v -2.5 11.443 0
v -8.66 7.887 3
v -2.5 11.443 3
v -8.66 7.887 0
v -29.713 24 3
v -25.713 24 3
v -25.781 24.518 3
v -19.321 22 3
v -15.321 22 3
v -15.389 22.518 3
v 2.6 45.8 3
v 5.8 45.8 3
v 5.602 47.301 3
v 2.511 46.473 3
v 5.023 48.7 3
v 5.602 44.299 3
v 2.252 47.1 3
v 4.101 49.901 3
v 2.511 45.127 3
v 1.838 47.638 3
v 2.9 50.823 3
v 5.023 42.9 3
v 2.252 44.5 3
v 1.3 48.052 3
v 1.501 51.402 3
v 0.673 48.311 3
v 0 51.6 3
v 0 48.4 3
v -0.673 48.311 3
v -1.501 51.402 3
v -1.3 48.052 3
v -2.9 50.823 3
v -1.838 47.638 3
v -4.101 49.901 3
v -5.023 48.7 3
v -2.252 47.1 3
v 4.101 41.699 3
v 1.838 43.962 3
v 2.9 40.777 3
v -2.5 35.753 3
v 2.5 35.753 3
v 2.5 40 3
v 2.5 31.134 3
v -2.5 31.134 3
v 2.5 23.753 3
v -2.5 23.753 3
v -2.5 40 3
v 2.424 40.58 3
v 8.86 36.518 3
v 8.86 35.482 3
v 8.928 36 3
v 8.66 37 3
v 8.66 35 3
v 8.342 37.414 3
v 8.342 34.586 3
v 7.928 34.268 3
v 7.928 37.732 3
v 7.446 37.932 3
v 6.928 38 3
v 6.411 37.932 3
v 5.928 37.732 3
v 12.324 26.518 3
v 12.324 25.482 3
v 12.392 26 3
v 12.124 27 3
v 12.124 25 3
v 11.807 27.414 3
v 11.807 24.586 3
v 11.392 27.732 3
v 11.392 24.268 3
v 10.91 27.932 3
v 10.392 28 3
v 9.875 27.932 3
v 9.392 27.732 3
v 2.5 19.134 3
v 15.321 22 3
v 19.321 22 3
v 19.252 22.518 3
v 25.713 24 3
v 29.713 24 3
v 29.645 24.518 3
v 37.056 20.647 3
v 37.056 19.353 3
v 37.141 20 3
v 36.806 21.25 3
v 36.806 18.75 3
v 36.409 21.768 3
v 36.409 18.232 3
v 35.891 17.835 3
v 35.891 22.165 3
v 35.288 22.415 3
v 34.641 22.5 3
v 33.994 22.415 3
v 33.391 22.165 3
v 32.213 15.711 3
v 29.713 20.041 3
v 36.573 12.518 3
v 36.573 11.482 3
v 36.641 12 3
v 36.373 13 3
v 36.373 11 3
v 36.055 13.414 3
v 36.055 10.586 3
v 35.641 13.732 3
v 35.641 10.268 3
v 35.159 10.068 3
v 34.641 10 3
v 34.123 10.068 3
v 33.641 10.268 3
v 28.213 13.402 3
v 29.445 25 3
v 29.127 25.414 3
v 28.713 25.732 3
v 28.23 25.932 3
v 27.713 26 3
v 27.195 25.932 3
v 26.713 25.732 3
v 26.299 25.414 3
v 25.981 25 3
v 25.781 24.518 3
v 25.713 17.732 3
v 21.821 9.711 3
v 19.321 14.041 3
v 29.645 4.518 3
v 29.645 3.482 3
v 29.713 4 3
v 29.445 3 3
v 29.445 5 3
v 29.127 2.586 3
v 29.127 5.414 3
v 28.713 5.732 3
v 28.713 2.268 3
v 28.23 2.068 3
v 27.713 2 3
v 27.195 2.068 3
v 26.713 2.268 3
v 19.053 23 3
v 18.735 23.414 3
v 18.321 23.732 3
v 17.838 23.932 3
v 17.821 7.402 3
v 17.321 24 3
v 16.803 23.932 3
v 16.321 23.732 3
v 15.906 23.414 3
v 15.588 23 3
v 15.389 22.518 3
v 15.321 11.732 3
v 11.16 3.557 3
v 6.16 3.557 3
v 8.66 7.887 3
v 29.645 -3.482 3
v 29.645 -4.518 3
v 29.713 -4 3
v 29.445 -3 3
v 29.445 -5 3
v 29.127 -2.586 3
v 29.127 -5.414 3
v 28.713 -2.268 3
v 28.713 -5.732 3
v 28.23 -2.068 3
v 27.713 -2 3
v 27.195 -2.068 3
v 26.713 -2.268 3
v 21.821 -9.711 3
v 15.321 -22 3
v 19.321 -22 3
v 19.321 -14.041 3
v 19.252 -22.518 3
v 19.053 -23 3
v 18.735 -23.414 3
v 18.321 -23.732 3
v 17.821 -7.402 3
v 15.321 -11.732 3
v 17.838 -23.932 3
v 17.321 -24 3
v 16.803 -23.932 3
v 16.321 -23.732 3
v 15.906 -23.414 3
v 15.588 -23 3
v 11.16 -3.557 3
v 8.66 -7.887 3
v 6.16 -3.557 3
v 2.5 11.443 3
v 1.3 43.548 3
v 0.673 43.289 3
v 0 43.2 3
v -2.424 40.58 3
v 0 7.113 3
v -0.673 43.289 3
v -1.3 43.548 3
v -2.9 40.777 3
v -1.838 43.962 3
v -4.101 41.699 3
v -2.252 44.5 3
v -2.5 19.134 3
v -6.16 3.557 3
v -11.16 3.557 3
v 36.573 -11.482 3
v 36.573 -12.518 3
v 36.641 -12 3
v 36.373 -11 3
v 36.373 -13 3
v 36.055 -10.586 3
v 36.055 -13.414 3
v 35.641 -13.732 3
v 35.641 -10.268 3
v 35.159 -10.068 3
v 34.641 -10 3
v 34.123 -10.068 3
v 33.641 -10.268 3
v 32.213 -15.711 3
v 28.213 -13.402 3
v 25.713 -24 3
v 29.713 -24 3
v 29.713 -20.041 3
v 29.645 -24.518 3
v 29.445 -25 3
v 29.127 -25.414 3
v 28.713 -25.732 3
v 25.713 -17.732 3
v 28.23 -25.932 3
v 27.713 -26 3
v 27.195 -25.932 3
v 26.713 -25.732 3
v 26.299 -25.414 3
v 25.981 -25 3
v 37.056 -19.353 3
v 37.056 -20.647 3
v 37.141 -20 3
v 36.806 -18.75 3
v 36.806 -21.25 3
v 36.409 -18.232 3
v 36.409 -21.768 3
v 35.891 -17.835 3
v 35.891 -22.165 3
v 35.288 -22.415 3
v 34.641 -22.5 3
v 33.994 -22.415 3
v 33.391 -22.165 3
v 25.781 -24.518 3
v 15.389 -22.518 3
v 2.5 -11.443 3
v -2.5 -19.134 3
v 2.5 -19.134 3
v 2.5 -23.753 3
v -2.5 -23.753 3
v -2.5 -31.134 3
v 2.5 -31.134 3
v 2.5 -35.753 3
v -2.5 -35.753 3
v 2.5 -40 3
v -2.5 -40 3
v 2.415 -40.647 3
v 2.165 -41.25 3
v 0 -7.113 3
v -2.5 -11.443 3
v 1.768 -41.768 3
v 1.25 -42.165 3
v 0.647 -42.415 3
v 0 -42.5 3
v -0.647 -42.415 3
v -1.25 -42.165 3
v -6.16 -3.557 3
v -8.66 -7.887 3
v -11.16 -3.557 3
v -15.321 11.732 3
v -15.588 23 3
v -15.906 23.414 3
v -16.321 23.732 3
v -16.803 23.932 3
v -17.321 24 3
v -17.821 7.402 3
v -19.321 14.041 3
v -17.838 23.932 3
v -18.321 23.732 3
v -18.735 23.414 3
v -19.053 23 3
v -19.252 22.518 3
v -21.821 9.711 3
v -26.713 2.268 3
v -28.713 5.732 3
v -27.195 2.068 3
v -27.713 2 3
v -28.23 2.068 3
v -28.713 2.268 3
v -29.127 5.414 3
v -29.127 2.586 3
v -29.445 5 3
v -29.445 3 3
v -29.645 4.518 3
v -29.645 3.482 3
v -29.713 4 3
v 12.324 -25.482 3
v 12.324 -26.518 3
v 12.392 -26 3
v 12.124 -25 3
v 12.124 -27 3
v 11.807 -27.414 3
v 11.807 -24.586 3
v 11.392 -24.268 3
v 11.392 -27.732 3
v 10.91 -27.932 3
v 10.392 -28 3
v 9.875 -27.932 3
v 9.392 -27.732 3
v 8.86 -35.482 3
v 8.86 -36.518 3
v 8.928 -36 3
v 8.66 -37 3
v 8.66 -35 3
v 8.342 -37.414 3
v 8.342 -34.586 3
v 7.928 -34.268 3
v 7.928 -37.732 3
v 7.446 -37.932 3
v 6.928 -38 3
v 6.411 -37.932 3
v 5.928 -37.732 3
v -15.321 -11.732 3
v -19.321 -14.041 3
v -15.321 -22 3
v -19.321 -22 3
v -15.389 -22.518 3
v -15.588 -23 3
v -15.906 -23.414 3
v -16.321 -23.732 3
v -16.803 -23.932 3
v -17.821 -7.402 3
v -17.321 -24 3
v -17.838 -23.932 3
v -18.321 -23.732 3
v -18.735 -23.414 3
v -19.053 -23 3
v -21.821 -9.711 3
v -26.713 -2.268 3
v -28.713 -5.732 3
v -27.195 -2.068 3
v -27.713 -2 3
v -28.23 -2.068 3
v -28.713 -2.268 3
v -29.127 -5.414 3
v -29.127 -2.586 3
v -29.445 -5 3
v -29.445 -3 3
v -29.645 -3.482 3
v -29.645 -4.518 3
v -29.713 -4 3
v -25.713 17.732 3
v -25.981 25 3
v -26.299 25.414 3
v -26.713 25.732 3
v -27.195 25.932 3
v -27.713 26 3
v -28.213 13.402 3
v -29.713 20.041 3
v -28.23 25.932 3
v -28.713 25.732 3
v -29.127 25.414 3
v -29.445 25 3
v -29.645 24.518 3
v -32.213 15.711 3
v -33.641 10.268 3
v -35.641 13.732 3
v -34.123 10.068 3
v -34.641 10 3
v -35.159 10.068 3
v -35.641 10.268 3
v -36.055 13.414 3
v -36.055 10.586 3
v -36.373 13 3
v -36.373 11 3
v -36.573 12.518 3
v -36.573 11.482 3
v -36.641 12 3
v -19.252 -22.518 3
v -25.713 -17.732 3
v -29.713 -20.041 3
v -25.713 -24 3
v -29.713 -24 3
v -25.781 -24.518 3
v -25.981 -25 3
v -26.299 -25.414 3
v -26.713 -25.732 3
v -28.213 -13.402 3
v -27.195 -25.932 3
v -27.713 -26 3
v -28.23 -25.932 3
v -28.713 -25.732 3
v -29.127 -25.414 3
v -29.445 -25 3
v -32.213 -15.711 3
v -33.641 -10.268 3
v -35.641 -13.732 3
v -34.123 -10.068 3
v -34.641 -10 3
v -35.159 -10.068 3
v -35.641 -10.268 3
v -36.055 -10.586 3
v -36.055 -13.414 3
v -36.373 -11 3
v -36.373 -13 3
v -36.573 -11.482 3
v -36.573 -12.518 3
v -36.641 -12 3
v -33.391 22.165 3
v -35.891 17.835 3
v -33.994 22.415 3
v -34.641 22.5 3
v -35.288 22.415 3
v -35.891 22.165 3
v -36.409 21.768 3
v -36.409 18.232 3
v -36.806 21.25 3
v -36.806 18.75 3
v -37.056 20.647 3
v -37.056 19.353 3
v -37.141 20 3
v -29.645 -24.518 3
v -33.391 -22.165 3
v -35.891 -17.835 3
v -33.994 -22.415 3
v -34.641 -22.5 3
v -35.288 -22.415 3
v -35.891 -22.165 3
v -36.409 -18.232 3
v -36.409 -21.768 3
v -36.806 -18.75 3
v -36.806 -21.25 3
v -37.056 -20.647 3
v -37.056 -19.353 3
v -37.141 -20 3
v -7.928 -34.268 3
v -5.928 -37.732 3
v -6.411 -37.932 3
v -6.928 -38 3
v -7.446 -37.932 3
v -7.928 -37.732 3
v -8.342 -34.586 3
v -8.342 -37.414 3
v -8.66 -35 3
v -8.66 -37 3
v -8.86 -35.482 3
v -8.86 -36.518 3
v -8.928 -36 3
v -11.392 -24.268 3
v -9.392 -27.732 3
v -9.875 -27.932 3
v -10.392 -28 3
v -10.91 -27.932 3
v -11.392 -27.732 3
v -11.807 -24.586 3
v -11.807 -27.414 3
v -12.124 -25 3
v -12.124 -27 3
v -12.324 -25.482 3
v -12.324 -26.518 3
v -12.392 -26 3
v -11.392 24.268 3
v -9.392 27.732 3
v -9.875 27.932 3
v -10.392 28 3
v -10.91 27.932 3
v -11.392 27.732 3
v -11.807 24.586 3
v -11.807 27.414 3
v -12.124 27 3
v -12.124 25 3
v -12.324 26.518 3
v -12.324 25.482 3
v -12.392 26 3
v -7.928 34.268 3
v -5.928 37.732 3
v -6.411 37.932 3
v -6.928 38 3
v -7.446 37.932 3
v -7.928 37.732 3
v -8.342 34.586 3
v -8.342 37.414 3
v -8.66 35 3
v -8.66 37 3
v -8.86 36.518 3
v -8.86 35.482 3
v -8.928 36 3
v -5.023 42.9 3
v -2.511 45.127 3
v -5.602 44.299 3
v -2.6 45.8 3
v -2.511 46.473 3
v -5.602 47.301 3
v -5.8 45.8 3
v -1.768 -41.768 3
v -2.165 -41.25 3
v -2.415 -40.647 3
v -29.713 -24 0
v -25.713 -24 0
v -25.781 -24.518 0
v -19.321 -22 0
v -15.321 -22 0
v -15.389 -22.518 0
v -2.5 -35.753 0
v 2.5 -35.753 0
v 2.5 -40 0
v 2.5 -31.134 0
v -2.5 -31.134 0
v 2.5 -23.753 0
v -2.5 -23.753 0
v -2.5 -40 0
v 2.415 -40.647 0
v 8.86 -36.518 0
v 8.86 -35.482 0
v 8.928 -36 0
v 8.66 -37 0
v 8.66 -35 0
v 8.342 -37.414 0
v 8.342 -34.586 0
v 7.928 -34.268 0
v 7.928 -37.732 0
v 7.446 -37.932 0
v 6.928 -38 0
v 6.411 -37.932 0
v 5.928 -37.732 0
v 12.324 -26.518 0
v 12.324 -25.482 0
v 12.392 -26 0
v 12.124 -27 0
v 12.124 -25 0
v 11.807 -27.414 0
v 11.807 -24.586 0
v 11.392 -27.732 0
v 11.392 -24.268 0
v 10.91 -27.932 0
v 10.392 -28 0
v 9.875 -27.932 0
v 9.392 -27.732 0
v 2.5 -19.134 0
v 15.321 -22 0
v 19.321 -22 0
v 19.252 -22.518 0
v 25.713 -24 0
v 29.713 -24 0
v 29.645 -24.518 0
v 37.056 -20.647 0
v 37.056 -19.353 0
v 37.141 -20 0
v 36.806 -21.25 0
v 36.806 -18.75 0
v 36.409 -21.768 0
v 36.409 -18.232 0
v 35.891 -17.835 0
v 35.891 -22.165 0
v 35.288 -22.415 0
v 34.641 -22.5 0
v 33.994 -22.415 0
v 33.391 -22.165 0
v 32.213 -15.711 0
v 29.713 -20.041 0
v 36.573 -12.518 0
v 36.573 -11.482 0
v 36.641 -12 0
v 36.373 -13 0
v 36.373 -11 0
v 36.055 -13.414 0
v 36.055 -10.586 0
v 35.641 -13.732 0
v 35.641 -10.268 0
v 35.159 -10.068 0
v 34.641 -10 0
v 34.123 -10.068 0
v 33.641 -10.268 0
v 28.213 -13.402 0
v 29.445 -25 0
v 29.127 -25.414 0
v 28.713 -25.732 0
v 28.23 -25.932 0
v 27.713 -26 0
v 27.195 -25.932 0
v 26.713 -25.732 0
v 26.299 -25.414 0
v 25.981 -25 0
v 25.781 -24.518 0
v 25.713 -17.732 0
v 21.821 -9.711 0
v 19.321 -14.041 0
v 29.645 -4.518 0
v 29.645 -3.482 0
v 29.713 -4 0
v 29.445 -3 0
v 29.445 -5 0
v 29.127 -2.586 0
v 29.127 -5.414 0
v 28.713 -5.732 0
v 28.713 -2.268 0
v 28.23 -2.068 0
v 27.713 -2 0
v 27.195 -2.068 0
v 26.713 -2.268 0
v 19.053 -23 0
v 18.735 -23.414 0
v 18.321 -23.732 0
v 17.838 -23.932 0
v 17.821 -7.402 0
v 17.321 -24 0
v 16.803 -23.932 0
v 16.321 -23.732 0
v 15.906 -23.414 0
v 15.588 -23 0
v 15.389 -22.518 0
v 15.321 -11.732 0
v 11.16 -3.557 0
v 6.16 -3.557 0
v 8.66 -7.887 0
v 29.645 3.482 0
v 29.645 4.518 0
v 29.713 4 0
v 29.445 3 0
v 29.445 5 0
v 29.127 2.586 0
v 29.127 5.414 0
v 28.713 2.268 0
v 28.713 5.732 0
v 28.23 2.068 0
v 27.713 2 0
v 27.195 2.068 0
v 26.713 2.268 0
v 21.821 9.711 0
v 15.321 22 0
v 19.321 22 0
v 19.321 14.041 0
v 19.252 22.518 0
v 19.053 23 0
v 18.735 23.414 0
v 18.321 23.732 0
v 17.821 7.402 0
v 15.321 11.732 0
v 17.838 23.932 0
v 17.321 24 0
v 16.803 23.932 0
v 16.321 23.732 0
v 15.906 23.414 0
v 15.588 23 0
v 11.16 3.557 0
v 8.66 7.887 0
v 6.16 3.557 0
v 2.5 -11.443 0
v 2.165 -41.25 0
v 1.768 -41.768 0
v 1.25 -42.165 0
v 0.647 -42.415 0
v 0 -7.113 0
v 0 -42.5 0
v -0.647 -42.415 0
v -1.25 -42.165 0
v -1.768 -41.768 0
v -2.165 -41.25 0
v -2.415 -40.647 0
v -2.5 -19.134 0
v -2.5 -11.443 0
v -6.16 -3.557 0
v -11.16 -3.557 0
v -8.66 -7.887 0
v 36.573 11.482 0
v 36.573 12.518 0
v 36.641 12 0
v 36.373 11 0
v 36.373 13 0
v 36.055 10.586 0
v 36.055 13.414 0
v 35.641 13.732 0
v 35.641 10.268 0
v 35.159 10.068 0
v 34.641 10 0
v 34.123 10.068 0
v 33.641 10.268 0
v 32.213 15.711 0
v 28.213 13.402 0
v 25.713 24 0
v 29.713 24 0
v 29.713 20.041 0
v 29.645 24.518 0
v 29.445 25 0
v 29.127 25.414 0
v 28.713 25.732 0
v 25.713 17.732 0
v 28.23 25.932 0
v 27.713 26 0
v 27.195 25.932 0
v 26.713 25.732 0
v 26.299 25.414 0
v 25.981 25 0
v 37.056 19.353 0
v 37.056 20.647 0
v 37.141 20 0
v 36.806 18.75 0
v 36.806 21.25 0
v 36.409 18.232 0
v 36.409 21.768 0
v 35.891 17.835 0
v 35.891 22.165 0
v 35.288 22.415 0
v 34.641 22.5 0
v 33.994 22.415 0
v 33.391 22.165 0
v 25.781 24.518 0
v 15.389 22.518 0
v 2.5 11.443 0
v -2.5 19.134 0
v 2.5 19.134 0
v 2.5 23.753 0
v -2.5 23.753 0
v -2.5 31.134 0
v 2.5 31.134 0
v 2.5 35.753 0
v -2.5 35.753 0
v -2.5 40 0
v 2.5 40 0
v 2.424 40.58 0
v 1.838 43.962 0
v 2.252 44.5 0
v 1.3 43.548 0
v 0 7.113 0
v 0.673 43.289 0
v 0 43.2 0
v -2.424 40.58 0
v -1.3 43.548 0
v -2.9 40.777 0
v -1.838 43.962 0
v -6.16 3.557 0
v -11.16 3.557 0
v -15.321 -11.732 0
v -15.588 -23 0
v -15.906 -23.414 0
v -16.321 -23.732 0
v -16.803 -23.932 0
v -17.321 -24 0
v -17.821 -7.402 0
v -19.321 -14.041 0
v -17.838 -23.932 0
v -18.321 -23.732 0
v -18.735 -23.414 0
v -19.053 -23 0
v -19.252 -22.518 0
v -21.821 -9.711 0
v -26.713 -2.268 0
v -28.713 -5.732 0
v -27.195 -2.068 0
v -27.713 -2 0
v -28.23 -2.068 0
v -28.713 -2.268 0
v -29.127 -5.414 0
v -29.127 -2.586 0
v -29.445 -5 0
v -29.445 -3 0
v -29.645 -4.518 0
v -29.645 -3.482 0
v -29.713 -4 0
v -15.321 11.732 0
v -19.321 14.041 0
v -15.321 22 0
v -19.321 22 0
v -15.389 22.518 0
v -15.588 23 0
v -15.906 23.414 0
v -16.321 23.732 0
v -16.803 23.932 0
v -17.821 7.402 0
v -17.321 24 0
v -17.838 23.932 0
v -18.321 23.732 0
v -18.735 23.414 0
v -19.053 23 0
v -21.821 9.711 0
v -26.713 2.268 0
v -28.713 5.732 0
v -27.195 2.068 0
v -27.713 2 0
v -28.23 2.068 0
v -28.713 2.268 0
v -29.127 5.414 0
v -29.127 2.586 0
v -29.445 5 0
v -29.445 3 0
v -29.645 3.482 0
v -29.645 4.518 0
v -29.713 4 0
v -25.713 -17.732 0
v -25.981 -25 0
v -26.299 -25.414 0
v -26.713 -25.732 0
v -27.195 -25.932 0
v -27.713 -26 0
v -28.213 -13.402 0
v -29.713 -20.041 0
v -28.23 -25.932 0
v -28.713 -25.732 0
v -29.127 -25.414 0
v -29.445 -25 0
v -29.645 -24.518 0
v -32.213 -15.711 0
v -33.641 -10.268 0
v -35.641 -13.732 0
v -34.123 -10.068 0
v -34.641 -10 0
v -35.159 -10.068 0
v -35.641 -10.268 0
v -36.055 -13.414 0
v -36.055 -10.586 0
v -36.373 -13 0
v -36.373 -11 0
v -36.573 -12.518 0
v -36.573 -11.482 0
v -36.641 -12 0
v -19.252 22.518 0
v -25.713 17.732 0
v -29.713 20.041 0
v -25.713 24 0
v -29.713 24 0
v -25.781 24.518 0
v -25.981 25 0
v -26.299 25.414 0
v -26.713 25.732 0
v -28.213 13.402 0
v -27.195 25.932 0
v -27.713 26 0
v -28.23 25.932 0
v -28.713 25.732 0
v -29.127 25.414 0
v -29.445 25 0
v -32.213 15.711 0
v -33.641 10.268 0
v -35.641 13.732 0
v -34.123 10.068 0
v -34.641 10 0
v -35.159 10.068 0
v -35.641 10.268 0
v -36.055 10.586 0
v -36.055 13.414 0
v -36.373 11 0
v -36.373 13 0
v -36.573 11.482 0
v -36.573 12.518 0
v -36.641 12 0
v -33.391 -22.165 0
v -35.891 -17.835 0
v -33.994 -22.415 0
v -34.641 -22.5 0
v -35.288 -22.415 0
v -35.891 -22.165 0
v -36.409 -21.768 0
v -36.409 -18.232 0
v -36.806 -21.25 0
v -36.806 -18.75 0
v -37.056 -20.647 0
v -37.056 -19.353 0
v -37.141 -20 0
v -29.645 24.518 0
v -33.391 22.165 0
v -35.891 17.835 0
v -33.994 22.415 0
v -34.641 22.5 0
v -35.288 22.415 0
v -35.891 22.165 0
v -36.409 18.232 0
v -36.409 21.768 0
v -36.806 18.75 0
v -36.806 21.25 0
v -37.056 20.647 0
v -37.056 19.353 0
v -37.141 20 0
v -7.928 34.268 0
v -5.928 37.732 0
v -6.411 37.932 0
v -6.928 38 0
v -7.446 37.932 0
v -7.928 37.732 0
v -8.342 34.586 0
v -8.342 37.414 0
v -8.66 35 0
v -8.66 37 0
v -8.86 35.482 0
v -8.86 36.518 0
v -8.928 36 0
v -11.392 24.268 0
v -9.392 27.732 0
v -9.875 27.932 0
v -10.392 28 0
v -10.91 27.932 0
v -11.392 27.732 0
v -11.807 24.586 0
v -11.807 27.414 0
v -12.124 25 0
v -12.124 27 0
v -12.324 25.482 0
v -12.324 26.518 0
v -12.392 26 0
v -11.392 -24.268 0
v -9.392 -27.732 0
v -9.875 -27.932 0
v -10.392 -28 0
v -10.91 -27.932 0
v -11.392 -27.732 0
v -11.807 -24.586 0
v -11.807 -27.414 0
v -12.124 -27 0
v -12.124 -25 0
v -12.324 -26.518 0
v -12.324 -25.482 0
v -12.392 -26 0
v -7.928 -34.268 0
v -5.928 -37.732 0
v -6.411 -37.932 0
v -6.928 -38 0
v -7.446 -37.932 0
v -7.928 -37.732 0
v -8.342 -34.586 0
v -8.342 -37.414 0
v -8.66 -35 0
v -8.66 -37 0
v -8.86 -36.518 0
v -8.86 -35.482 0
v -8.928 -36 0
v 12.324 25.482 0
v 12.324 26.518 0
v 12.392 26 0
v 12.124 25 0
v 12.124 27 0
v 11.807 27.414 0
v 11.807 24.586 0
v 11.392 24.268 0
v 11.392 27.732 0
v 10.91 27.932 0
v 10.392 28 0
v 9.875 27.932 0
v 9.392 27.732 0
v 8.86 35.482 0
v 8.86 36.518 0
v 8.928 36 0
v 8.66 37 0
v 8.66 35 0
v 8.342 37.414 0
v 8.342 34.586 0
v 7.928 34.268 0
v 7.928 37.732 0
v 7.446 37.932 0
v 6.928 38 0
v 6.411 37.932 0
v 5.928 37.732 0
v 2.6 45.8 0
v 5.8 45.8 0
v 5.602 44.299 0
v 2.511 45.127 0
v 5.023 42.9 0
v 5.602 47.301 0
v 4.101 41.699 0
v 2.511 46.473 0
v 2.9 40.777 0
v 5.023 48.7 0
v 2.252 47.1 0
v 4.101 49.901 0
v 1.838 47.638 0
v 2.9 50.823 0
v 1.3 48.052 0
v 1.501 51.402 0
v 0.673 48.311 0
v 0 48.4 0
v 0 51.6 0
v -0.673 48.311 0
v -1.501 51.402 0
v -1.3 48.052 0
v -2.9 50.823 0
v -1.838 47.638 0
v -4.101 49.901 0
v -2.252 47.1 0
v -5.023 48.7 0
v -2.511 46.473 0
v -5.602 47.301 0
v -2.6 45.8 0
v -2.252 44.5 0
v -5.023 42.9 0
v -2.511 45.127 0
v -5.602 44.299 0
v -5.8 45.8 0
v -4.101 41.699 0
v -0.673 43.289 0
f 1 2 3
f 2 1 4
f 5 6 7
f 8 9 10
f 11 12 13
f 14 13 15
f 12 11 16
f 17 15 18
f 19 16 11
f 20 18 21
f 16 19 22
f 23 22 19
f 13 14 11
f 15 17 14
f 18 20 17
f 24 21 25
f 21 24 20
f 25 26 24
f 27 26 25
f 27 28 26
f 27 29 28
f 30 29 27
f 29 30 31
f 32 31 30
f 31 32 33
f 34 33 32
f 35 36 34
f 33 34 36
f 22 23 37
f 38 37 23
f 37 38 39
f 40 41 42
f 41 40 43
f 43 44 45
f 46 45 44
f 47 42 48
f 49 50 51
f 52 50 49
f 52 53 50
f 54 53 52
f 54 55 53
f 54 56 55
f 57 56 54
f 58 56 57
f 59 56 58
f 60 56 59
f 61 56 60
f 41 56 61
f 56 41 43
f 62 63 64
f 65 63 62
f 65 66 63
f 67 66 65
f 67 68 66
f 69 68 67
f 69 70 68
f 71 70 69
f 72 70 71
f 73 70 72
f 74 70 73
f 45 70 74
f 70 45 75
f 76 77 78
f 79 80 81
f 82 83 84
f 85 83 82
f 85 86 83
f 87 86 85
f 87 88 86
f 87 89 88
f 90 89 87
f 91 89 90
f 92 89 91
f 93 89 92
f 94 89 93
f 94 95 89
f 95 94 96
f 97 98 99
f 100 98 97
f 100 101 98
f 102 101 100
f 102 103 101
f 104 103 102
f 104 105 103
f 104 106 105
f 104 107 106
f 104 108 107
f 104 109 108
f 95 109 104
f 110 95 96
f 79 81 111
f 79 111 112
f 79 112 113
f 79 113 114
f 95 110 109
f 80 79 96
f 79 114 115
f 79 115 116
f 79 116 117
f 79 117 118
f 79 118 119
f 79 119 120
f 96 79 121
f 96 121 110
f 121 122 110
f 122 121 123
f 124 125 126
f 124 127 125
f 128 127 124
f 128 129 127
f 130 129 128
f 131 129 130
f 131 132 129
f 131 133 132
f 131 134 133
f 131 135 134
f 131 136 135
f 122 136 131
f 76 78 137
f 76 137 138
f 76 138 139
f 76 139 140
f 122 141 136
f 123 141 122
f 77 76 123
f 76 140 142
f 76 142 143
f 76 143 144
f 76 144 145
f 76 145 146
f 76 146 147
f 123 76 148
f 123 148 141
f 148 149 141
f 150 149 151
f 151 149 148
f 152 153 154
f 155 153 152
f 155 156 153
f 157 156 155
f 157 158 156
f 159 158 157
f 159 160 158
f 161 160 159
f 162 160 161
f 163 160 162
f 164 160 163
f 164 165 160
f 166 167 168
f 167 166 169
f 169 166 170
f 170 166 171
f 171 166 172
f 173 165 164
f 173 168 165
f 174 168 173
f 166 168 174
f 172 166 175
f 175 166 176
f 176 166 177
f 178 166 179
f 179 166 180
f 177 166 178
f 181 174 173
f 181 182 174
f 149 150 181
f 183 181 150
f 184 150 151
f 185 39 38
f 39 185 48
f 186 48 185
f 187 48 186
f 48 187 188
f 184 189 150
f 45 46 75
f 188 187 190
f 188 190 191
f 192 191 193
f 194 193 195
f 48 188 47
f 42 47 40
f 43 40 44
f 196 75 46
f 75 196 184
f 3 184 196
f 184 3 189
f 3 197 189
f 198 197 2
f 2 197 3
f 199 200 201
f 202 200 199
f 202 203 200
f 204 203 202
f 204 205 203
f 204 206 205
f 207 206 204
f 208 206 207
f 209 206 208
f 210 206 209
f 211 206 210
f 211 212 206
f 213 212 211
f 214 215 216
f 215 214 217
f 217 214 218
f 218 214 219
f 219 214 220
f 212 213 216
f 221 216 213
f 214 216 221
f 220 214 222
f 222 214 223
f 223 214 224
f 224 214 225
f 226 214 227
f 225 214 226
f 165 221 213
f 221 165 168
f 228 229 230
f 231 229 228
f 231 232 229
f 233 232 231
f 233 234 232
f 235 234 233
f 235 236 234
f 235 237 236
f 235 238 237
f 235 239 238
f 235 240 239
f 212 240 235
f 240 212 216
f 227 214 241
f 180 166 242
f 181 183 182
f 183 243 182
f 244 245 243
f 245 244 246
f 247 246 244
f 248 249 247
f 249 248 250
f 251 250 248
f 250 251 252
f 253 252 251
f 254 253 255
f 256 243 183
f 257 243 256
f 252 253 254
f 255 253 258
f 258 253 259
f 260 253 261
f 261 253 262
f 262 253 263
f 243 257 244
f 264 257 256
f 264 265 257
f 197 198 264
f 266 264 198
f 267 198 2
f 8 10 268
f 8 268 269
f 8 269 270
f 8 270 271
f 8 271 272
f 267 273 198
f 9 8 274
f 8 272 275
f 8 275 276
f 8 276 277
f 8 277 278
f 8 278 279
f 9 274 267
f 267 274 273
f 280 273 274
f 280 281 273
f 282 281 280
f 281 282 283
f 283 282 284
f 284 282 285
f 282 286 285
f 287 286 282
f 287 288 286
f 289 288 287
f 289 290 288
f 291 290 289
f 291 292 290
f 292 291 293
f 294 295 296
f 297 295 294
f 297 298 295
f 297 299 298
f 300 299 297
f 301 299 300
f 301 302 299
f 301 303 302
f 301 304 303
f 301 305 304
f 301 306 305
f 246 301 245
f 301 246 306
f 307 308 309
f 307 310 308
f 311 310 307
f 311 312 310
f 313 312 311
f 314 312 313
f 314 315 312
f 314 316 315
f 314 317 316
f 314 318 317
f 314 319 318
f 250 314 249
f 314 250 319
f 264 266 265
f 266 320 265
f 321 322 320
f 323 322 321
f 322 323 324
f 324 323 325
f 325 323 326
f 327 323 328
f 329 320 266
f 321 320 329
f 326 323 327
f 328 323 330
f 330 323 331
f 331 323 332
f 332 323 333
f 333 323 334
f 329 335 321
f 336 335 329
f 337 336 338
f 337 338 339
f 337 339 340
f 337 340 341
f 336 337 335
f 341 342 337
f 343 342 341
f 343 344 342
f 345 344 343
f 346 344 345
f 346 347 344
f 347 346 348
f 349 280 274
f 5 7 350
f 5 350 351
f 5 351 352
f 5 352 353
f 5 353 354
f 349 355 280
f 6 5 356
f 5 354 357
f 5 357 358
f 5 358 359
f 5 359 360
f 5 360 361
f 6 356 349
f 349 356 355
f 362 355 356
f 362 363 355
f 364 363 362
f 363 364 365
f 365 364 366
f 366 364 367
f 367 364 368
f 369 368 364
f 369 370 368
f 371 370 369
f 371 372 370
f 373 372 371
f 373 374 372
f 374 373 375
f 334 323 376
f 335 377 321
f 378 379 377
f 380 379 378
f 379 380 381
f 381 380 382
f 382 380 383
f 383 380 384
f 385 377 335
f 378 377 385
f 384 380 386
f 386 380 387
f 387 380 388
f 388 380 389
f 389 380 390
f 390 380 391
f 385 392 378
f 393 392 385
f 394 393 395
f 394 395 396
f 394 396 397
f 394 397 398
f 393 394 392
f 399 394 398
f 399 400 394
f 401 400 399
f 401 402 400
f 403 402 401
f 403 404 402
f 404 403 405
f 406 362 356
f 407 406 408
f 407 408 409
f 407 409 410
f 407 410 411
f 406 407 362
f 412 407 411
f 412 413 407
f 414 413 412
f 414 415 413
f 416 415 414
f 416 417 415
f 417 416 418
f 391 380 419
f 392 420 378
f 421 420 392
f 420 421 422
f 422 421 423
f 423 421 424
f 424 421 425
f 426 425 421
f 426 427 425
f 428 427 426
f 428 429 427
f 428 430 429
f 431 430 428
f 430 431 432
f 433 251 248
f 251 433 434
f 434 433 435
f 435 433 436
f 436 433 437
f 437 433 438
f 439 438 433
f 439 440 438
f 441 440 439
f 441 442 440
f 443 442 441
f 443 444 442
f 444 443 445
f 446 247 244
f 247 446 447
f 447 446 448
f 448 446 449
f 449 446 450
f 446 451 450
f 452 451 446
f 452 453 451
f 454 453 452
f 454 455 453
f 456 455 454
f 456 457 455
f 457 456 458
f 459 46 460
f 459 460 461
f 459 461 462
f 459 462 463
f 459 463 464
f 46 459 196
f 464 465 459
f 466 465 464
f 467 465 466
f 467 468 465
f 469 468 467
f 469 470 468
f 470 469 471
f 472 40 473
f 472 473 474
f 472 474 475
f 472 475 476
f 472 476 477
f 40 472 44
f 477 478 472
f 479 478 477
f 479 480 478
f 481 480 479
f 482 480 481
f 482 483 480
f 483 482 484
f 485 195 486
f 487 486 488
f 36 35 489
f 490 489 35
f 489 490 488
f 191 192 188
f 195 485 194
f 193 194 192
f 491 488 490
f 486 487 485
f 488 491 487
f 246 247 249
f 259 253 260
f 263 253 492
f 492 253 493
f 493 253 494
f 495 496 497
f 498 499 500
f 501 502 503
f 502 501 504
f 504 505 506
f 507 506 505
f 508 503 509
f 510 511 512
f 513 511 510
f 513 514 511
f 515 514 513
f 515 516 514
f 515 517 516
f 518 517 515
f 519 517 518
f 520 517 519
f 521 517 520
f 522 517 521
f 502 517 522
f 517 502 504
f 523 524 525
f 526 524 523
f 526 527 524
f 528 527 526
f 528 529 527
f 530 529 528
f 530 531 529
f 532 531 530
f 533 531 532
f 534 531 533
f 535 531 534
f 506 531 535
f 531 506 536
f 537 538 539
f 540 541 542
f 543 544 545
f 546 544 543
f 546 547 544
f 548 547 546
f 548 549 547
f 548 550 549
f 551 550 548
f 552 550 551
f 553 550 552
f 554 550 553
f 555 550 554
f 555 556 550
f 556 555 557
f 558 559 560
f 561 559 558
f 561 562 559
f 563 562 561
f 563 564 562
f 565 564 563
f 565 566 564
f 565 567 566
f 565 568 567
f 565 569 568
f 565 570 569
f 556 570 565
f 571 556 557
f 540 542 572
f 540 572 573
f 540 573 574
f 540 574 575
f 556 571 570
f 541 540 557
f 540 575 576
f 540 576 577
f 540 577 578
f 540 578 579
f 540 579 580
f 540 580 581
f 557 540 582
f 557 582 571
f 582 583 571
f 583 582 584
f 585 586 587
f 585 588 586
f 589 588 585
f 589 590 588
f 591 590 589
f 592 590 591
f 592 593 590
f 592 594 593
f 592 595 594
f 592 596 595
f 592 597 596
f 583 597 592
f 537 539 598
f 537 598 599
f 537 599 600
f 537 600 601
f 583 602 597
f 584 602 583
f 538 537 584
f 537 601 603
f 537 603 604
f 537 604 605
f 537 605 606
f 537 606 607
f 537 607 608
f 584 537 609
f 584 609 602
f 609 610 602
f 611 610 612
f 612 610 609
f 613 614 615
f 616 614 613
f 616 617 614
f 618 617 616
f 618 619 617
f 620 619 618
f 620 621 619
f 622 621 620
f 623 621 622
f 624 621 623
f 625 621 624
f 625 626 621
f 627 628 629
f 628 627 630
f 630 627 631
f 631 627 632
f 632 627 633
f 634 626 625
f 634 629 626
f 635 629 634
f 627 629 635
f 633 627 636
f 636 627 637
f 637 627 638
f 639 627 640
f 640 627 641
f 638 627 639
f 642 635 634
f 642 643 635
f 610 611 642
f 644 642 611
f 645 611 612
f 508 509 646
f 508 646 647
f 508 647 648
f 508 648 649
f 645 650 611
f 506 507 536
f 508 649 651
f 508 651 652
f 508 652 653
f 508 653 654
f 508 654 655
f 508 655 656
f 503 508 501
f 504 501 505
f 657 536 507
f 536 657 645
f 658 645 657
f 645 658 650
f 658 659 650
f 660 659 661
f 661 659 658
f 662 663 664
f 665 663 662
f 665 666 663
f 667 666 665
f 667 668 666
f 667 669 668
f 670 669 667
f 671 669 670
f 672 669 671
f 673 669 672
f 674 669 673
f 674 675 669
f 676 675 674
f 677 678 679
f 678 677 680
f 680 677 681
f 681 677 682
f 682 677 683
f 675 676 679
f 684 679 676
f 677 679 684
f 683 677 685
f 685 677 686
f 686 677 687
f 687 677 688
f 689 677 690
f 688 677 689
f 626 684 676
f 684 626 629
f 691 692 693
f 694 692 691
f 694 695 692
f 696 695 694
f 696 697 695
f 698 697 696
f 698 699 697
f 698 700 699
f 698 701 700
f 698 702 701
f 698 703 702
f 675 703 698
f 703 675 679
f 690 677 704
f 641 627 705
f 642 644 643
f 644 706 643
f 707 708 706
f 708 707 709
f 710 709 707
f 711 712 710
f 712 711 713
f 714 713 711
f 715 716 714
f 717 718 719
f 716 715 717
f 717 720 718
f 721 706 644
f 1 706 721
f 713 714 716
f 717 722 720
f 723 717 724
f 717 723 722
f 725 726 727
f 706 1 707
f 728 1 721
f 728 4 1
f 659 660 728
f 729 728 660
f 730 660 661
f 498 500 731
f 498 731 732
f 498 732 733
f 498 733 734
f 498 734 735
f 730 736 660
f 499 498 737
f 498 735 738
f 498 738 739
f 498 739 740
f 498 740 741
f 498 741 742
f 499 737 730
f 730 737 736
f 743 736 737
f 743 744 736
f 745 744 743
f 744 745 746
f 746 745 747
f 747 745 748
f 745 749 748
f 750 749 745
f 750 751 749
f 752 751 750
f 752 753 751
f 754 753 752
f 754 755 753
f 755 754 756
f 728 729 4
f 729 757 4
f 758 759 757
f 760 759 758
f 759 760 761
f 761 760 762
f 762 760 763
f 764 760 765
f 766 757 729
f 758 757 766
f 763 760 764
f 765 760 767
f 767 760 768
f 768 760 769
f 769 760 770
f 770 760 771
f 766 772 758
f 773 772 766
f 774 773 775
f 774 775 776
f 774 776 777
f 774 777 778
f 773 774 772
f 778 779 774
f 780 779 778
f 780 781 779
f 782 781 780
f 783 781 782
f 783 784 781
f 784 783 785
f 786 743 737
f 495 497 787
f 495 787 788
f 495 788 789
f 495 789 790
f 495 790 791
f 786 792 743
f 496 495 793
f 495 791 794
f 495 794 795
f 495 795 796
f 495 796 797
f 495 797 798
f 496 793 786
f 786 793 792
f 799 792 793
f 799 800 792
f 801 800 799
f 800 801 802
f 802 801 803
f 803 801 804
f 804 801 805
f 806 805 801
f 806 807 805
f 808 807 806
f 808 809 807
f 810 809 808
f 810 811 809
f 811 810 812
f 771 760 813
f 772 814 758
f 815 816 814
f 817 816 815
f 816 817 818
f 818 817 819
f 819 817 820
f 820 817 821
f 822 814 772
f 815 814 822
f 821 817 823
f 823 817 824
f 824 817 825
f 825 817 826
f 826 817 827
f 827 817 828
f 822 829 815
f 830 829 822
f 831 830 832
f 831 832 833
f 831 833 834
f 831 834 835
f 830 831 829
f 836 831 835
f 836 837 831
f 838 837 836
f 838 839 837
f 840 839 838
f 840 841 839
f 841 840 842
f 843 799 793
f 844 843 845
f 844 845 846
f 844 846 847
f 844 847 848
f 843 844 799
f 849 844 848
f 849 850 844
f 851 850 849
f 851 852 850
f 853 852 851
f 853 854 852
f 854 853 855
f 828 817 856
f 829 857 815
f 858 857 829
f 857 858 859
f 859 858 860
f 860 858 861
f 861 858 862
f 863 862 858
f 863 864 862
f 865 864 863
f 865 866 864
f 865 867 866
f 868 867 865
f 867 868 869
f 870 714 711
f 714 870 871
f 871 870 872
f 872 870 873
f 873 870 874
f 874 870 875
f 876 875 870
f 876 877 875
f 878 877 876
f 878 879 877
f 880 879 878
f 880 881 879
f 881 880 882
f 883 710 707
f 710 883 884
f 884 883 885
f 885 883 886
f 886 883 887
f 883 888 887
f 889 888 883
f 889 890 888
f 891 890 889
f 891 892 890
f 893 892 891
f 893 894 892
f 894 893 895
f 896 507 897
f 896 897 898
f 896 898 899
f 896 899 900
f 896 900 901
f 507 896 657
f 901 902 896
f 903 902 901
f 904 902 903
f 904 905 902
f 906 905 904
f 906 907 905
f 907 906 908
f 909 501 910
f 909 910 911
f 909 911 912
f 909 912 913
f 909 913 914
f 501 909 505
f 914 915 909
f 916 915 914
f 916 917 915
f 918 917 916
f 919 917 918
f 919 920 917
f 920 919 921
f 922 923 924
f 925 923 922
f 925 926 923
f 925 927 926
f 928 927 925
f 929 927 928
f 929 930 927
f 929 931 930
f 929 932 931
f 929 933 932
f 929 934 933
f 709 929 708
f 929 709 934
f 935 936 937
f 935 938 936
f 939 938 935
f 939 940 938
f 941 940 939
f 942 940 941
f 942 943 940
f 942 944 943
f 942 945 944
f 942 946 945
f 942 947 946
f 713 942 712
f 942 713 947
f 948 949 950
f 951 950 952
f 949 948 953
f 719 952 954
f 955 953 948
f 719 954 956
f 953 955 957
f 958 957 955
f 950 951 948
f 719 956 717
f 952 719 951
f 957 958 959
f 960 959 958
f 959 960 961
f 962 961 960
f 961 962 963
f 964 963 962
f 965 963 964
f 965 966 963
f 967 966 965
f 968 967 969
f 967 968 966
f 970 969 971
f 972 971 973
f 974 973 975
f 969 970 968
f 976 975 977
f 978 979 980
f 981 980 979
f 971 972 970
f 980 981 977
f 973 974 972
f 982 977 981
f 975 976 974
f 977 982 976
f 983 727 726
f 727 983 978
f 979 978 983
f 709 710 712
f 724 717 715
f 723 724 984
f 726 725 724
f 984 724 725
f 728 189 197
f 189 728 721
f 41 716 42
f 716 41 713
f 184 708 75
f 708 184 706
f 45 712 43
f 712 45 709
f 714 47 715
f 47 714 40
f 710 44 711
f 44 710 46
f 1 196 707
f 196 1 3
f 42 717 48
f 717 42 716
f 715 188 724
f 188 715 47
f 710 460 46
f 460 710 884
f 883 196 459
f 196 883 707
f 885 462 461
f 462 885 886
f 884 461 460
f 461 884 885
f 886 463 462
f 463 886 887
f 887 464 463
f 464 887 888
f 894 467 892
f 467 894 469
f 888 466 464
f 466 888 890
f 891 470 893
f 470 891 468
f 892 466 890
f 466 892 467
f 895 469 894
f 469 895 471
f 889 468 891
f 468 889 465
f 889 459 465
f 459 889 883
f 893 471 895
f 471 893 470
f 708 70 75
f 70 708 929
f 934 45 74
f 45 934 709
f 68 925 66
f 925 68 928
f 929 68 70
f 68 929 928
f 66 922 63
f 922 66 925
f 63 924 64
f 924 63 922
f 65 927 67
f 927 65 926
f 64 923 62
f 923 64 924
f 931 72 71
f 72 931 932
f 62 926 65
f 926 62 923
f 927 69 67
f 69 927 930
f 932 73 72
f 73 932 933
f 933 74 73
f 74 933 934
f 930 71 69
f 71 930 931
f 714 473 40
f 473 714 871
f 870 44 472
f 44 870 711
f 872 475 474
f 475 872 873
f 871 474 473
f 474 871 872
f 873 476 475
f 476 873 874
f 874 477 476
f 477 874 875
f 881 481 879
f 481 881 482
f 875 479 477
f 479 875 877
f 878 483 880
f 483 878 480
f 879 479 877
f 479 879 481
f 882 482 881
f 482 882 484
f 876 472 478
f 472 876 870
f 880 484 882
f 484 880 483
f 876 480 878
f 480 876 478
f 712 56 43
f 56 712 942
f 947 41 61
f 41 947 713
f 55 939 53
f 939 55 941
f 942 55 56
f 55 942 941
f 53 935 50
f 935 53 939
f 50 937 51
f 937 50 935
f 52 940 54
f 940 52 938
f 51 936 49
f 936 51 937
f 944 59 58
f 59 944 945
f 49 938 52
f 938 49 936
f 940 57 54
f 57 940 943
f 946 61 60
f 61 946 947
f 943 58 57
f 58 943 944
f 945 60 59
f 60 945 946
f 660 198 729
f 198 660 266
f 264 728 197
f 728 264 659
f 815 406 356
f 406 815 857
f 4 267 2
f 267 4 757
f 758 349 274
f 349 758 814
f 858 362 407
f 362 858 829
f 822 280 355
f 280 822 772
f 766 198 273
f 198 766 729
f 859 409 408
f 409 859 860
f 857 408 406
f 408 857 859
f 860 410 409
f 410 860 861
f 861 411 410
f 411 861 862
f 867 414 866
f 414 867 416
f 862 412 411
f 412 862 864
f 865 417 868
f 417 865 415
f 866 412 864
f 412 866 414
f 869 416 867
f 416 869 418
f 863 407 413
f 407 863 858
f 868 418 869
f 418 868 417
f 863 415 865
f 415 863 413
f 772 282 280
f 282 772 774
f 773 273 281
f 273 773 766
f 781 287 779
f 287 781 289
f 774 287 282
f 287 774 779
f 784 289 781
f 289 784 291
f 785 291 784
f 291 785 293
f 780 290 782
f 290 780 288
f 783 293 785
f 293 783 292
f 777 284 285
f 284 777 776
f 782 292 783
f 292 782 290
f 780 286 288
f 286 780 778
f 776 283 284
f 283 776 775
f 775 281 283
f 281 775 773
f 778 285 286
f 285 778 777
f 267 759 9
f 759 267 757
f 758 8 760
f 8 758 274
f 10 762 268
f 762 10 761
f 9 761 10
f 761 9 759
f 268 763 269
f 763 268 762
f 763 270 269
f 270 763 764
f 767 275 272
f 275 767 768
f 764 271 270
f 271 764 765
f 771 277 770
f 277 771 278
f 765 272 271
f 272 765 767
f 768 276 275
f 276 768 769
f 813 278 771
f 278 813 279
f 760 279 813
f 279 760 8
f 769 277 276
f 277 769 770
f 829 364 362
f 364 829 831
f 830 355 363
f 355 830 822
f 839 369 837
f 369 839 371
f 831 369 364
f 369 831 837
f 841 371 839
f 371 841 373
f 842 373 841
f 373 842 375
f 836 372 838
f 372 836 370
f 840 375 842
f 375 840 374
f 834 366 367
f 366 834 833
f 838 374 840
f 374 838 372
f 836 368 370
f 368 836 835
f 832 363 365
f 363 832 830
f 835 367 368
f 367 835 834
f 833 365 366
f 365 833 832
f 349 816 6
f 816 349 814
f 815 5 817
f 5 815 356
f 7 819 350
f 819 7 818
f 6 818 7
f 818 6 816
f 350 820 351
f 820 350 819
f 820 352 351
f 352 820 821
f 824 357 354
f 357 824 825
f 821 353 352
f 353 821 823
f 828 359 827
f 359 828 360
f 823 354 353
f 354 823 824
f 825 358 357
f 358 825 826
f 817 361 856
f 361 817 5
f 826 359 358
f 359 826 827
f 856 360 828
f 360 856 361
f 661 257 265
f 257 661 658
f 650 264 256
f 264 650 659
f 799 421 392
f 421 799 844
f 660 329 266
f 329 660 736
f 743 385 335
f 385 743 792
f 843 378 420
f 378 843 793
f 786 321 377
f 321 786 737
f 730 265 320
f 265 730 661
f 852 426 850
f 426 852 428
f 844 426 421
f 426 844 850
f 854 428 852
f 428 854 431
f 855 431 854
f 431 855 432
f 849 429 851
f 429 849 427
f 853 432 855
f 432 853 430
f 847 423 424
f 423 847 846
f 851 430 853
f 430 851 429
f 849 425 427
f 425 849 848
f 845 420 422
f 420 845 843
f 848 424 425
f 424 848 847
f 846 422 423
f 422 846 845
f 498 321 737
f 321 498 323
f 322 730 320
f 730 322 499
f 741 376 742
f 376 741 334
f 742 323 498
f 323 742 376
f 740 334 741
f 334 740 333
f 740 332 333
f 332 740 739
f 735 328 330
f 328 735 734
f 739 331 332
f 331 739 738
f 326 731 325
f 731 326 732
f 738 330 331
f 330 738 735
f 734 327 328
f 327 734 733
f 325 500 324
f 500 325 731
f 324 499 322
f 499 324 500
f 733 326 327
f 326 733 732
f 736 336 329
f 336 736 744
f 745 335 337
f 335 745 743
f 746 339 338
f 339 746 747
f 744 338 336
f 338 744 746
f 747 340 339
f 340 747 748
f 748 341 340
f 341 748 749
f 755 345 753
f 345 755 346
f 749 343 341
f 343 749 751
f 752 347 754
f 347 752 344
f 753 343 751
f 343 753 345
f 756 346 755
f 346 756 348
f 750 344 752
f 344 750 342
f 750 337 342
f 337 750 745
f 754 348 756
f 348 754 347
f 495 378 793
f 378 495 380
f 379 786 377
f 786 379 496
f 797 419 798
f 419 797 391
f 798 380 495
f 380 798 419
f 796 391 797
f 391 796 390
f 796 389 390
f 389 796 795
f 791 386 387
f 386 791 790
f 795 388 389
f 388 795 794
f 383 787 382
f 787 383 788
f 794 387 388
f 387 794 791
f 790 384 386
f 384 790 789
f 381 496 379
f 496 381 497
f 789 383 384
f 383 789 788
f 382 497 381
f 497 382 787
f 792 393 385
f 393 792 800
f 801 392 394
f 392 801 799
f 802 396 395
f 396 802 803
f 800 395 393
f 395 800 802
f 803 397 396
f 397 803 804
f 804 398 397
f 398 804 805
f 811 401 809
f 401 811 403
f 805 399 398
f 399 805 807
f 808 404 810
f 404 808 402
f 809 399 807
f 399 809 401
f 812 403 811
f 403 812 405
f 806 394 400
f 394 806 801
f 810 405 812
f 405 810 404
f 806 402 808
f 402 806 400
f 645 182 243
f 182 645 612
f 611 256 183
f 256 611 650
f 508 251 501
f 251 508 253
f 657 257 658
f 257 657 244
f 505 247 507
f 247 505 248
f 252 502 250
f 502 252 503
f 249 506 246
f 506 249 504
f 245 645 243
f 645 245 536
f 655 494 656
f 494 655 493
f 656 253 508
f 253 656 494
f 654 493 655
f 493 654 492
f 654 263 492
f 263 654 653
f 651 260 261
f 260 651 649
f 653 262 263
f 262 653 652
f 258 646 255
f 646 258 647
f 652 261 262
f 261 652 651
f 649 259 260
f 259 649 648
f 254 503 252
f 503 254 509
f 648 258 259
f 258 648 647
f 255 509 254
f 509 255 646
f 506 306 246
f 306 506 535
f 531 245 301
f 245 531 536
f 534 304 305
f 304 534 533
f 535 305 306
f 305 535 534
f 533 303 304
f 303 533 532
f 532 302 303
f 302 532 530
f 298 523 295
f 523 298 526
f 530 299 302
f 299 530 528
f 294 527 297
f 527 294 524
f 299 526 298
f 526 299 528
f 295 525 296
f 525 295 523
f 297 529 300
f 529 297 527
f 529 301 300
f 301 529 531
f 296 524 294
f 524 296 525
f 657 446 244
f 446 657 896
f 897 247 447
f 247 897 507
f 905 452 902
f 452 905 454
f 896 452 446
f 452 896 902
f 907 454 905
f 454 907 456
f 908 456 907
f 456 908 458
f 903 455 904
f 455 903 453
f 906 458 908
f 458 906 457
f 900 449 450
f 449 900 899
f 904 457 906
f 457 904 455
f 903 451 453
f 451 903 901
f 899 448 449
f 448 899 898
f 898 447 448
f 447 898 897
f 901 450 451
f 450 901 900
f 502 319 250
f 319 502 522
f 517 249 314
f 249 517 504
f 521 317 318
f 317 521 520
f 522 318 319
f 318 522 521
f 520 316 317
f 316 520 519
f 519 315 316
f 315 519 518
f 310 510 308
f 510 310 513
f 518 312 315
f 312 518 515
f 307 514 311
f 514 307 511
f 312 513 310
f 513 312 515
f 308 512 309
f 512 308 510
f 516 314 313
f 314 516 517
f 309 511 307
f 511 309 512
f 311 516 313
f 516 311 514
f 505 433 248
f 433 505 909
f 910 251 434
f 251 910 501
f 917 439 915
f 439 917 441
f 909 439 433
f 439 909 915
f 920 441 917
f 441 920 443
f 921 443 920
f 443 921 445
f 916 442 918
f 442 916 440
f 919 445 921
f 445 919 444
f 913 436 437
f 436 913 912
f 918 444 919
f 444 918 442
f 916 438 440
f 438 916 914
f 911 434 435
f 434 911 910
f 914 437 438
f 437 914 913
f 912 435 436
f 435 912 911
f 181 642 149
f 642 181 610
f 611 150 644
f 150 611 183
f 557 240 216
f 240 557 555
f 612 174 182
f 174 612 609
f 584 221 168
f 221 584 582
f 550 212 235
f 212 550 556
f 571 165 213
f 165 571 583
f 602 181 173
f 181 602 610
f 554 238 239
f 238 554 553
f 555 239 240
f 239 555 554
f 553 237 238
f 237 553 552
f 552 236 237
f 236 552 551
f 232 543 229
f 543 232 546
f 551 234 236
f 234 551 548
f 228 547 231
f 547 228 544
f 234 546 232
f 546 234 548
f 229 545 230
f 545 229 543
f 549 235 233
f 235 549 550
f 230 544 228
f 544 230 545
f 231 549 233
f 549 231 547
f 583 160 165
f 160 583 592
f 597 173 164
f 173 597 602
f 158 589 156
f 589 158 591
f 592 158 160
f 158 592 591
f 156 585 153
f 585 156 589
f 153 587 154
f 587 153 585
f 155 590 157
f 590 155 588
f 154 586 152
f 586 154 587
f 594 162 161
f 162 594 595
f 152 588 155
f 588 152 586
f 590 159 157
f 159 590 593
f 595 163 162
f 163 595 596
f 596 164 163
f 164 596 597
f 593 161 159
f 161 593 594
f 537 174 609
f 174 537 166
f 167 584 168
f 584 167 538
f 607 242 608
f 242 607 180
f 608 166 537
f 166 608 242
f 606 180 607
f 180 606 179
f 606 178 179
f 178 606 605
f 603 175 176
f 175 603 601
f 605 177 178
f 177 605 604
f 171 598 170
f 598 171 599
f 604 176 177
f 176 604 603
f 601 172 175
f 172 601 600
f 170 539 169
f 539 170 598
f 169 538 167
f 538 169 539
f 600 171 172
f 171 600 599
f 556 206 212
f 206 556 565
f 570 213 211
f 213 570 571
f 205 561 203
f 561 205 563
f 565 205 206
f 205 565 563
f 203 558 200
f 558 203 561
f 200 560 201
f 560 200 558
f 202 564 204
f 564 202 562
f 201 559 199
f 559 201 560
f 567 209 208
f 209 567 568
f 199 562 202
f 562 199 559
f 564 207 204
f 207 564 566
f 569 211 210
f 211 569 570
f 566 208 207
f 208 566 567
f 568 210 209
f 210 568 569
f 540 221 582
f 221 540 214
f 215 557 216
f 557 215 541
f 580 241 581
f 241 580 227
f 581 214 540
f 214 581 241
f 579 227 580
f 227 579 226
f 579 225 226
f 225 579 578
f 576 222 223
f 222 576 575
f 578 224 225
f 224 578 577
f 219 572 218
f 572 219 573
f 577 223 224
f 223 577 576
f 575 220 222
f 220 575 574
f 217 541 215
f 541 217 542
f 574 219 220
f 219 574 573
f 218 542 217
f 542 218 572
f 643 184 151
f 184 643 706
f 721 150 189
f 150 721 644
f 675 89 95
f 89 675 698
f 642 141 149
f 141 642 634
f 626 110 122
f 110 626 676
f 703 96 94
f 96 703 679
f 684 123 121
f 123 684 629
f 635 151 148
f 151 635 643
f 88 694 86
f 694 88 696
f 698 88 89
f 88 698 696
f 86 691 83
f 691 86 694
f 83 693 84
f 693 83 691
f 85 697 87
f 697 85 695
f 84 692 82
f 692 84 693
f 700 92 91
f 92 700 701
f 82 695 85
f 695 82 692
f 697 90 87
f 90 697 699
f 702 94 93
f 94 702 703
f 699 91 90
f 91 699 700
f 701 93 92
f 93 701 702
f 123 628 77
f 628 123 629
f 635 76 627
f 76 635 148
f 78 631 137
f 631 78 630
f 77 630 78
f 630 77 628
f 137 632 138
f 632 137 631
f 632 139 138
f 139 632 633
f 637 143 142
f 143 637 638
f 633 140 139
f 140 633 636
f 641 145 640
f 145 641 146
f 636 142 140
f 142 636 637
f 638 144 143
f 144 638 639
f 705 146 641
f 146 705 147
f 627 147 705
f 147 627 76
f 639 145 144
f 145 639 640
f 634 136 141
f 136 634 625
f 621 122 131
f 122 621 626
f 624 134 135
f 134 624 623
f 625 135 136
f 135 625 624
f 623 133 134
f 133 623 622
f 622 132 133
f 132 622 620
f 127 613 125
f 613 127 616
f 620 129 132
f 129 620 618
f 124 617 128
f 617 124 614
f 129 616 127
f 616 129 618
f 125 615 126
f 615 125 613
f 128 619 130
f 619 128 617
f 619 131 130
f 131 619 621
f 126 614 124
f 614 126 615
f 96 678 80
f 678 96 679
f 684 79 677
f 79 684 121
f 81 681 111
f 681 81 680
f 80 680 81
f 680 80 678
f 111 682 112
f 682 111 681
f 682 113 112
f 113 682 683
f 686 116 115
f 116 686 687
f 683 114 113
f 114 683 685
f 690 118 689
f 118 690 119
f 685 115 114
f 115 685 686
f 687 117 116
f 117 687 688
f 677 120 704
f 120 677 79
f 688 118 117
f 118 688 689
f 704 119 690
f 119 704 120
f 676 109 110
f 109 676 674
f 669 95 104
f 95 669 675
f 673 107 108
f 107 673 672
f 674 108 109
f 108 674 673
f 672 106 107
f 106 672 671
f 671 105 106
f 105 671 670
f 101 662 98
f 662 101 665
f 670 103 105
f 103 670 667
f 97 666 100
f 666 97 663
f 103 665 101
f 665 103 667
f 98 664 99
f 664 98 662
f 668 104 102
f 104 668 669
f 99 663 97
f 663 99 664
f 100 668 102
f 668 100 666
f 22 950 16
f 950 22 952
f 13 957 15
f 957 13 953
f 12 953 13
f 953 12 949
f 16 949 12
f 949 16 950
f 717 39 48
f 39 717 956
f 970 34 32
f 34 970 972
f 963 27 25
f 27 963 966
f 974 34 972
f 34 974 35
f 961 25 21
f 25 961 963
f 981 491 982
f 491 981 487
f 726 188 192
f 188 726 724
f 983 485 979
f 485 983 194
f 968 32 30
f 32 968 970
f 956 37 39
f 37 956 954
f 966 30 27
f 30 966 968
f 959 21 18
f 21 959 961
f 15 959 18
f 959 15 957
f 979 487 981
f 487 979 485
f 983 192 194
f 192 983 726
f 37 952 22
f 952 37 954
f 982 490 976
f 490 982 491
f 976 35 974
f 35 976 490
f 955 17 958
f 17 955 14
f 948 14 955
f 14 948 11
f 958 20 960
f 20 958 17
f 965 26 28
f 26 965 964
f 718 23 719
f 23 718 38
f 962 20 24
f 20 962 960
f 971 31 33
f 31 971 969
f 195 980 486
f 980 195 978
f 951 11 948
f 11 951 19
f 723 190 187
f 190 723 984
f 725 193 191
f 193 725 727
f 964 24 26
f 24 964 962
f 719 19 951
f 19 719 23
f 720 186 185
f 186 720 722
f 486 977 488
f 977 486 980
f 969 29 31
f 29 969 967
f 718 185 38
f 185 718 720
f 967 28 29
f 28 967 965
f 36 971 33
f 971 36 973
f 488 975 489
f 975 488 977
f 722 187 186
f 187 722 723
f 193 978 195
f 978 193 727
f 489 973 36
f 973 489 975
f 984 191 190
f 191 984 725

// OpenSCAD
// snowflake 3
// @author Ilya Protasov

/* TODO
? fix central figure for branch_count
? hole hanger type
*/

/* [Base] */
height = 3;
radius = 40;
hanger_type = "ring";// [ring, slot ,none]
// only for slot hanger type
slot_rounded = true;

/* [Extended coefficients] */
// coefficient of radius for central (main) branch thickness
central_thickness_coef = 0.125; // [0:0.001:0.300]
central_branch_start_coef = 0.25; // [0:0.001:1]

middle_branch_start_coef = 0.5; // [0:0.001:1]
middle_branch_length_coef = 0.3; // [0:0.001:1]
middle_thickness_coef = 0.100; // [0:0.001:0.300]

outer_branch_start_coef = 0.8; // [0:0.001:1]
outer_branch_length_coef = 0.2; // [0:0.001:1]
outer_thickness_coef = 0.100; // [0:0.001:0.300]

// (for ring type hanger only)
ring_inner_radius_coef = 0.065; // [0:0.001:0.300]
// difference between outer and inner radius (for ring type hanger only)
ring_thick_coef = 0.080; // [0:0.001:0.300]

slot_start_coef = 0.95; // [0:0.01:1.000]
// slot thickness coeficient from snowflake height
slot_thick_coef = 0.100; // [0:0.001:2.200]
// slot height coeficient from snowflake height
slot_height_coef = 0.300; // [0:0.001:0.500]
// change it only if slot intersects main sub branches
slot_length_coef = 1.010; // [1.010:0.001:5.000]

/* [Quality ] */
//count of segments in arcs https://en.wikibooks.org/wiki/OpenSCAD_User_Manual/Other_Language_Features#$fa,_$fs_and_$fn
$fn = 24; 

/* [Hidden]  */
branch_count = 6;

thickMain = radius * central_thickness_coef;
middleThick = radius * middle_thickness_coef;
outerThick = radius * outer_thickness_coef;

module branchMain() {
    centralAngle = 120;//360 / branch_count * 2;
    lenHex = radius * central_branch_start_coef;
    middleStart = radius * middle_branch_start_coef;
    outerStart = radius * outer_branch_start_coef;
    
    //central hexagon
    translate([0, lenHex, 0]) rotate([0, 0, centralAngle]) branch2(thickMain, lenHex);
    
    //central branch
    translate([0, lenHex, 0]) branch2(thickMain, radius-lenHex);
    
    //middle branchs
    translate([0, middleStart, 0]) rotate([0, 0, 60]) branch2(middleThick, radius * middle_branch_length_coef);
    translate([0, middleStart, 0]) rotate([0, 0, -60]) branch2(middleThick, radius * middle_branch_length_coef);
    
    //outer branchs
    translate([0, outerStart, 0]) rotate([0, 0, 60]) branch2(outerThick, radius * outer_branch_length_coef);
    translate([0, outerStart, 0]) rotate([0, 0, -60]) branch2(outerThick, radius * outer_branch_length_coef);
}

module branch2(thick, length) {
    translate([-thick/2, 0, 0]) cube([thick, length, height], false);
    translate([0, length, 0]) cylinder(height, thick/2, thick/2, false);
}

module ring(height, outerR, innerR) {
    difference() {
        cylinder(height, outerR, outerR, true);
        cylinder(height * 2, innerR, innerR, true);
    }
}

module slot(length, thick, height, rounded = true) {
    if (rounded) {
        rotate([0, 90, 0]) {
            translate([0, thick/2 - height/2, 0]) 
                cylinder(length, height/2, height/2, true);
            translate([0, -thick/2 + height/2, 0]) 
                cylinder(length, height/2, height/2, true);
        }
    }
    
    cube([length,
          thick - height * (rounded ? 1 : 0), 
          height], true);
        
}

module snowflake3(branchCount) {
    angle = 360 / branchCount;
    ringInnerRadius = radius * ring_inner_radius_coef;
    ringThick = radius * ring_thick_coef;
    difference() {
        union() {
            for (i=[0:branchCount-1]) {
                rotate([0, 0, i * angle]) branchMain();
            }
        }        
        if (hanger_type == "slot") {
            translate([0, radius * slot_start_coef, height/2])
                slot(radius * central_thickness_coef * slot_length_coef,
                    radius * slot_thick_coef, 
                    height * slot_height_coef,
                    rounded = slot_rounded);
            }
    }
    if (hanger_type == "ring") {
        translate([0, radius + ringInnerRadius + ringThick, height/2])
            ring(height = height, 
                 outerR = ringInnerRadius + ringThick,
                 innerR = ringInnerRadius );
    }
    
        
}

color("DeepSkyBlue") snowflake3(branch_count);
